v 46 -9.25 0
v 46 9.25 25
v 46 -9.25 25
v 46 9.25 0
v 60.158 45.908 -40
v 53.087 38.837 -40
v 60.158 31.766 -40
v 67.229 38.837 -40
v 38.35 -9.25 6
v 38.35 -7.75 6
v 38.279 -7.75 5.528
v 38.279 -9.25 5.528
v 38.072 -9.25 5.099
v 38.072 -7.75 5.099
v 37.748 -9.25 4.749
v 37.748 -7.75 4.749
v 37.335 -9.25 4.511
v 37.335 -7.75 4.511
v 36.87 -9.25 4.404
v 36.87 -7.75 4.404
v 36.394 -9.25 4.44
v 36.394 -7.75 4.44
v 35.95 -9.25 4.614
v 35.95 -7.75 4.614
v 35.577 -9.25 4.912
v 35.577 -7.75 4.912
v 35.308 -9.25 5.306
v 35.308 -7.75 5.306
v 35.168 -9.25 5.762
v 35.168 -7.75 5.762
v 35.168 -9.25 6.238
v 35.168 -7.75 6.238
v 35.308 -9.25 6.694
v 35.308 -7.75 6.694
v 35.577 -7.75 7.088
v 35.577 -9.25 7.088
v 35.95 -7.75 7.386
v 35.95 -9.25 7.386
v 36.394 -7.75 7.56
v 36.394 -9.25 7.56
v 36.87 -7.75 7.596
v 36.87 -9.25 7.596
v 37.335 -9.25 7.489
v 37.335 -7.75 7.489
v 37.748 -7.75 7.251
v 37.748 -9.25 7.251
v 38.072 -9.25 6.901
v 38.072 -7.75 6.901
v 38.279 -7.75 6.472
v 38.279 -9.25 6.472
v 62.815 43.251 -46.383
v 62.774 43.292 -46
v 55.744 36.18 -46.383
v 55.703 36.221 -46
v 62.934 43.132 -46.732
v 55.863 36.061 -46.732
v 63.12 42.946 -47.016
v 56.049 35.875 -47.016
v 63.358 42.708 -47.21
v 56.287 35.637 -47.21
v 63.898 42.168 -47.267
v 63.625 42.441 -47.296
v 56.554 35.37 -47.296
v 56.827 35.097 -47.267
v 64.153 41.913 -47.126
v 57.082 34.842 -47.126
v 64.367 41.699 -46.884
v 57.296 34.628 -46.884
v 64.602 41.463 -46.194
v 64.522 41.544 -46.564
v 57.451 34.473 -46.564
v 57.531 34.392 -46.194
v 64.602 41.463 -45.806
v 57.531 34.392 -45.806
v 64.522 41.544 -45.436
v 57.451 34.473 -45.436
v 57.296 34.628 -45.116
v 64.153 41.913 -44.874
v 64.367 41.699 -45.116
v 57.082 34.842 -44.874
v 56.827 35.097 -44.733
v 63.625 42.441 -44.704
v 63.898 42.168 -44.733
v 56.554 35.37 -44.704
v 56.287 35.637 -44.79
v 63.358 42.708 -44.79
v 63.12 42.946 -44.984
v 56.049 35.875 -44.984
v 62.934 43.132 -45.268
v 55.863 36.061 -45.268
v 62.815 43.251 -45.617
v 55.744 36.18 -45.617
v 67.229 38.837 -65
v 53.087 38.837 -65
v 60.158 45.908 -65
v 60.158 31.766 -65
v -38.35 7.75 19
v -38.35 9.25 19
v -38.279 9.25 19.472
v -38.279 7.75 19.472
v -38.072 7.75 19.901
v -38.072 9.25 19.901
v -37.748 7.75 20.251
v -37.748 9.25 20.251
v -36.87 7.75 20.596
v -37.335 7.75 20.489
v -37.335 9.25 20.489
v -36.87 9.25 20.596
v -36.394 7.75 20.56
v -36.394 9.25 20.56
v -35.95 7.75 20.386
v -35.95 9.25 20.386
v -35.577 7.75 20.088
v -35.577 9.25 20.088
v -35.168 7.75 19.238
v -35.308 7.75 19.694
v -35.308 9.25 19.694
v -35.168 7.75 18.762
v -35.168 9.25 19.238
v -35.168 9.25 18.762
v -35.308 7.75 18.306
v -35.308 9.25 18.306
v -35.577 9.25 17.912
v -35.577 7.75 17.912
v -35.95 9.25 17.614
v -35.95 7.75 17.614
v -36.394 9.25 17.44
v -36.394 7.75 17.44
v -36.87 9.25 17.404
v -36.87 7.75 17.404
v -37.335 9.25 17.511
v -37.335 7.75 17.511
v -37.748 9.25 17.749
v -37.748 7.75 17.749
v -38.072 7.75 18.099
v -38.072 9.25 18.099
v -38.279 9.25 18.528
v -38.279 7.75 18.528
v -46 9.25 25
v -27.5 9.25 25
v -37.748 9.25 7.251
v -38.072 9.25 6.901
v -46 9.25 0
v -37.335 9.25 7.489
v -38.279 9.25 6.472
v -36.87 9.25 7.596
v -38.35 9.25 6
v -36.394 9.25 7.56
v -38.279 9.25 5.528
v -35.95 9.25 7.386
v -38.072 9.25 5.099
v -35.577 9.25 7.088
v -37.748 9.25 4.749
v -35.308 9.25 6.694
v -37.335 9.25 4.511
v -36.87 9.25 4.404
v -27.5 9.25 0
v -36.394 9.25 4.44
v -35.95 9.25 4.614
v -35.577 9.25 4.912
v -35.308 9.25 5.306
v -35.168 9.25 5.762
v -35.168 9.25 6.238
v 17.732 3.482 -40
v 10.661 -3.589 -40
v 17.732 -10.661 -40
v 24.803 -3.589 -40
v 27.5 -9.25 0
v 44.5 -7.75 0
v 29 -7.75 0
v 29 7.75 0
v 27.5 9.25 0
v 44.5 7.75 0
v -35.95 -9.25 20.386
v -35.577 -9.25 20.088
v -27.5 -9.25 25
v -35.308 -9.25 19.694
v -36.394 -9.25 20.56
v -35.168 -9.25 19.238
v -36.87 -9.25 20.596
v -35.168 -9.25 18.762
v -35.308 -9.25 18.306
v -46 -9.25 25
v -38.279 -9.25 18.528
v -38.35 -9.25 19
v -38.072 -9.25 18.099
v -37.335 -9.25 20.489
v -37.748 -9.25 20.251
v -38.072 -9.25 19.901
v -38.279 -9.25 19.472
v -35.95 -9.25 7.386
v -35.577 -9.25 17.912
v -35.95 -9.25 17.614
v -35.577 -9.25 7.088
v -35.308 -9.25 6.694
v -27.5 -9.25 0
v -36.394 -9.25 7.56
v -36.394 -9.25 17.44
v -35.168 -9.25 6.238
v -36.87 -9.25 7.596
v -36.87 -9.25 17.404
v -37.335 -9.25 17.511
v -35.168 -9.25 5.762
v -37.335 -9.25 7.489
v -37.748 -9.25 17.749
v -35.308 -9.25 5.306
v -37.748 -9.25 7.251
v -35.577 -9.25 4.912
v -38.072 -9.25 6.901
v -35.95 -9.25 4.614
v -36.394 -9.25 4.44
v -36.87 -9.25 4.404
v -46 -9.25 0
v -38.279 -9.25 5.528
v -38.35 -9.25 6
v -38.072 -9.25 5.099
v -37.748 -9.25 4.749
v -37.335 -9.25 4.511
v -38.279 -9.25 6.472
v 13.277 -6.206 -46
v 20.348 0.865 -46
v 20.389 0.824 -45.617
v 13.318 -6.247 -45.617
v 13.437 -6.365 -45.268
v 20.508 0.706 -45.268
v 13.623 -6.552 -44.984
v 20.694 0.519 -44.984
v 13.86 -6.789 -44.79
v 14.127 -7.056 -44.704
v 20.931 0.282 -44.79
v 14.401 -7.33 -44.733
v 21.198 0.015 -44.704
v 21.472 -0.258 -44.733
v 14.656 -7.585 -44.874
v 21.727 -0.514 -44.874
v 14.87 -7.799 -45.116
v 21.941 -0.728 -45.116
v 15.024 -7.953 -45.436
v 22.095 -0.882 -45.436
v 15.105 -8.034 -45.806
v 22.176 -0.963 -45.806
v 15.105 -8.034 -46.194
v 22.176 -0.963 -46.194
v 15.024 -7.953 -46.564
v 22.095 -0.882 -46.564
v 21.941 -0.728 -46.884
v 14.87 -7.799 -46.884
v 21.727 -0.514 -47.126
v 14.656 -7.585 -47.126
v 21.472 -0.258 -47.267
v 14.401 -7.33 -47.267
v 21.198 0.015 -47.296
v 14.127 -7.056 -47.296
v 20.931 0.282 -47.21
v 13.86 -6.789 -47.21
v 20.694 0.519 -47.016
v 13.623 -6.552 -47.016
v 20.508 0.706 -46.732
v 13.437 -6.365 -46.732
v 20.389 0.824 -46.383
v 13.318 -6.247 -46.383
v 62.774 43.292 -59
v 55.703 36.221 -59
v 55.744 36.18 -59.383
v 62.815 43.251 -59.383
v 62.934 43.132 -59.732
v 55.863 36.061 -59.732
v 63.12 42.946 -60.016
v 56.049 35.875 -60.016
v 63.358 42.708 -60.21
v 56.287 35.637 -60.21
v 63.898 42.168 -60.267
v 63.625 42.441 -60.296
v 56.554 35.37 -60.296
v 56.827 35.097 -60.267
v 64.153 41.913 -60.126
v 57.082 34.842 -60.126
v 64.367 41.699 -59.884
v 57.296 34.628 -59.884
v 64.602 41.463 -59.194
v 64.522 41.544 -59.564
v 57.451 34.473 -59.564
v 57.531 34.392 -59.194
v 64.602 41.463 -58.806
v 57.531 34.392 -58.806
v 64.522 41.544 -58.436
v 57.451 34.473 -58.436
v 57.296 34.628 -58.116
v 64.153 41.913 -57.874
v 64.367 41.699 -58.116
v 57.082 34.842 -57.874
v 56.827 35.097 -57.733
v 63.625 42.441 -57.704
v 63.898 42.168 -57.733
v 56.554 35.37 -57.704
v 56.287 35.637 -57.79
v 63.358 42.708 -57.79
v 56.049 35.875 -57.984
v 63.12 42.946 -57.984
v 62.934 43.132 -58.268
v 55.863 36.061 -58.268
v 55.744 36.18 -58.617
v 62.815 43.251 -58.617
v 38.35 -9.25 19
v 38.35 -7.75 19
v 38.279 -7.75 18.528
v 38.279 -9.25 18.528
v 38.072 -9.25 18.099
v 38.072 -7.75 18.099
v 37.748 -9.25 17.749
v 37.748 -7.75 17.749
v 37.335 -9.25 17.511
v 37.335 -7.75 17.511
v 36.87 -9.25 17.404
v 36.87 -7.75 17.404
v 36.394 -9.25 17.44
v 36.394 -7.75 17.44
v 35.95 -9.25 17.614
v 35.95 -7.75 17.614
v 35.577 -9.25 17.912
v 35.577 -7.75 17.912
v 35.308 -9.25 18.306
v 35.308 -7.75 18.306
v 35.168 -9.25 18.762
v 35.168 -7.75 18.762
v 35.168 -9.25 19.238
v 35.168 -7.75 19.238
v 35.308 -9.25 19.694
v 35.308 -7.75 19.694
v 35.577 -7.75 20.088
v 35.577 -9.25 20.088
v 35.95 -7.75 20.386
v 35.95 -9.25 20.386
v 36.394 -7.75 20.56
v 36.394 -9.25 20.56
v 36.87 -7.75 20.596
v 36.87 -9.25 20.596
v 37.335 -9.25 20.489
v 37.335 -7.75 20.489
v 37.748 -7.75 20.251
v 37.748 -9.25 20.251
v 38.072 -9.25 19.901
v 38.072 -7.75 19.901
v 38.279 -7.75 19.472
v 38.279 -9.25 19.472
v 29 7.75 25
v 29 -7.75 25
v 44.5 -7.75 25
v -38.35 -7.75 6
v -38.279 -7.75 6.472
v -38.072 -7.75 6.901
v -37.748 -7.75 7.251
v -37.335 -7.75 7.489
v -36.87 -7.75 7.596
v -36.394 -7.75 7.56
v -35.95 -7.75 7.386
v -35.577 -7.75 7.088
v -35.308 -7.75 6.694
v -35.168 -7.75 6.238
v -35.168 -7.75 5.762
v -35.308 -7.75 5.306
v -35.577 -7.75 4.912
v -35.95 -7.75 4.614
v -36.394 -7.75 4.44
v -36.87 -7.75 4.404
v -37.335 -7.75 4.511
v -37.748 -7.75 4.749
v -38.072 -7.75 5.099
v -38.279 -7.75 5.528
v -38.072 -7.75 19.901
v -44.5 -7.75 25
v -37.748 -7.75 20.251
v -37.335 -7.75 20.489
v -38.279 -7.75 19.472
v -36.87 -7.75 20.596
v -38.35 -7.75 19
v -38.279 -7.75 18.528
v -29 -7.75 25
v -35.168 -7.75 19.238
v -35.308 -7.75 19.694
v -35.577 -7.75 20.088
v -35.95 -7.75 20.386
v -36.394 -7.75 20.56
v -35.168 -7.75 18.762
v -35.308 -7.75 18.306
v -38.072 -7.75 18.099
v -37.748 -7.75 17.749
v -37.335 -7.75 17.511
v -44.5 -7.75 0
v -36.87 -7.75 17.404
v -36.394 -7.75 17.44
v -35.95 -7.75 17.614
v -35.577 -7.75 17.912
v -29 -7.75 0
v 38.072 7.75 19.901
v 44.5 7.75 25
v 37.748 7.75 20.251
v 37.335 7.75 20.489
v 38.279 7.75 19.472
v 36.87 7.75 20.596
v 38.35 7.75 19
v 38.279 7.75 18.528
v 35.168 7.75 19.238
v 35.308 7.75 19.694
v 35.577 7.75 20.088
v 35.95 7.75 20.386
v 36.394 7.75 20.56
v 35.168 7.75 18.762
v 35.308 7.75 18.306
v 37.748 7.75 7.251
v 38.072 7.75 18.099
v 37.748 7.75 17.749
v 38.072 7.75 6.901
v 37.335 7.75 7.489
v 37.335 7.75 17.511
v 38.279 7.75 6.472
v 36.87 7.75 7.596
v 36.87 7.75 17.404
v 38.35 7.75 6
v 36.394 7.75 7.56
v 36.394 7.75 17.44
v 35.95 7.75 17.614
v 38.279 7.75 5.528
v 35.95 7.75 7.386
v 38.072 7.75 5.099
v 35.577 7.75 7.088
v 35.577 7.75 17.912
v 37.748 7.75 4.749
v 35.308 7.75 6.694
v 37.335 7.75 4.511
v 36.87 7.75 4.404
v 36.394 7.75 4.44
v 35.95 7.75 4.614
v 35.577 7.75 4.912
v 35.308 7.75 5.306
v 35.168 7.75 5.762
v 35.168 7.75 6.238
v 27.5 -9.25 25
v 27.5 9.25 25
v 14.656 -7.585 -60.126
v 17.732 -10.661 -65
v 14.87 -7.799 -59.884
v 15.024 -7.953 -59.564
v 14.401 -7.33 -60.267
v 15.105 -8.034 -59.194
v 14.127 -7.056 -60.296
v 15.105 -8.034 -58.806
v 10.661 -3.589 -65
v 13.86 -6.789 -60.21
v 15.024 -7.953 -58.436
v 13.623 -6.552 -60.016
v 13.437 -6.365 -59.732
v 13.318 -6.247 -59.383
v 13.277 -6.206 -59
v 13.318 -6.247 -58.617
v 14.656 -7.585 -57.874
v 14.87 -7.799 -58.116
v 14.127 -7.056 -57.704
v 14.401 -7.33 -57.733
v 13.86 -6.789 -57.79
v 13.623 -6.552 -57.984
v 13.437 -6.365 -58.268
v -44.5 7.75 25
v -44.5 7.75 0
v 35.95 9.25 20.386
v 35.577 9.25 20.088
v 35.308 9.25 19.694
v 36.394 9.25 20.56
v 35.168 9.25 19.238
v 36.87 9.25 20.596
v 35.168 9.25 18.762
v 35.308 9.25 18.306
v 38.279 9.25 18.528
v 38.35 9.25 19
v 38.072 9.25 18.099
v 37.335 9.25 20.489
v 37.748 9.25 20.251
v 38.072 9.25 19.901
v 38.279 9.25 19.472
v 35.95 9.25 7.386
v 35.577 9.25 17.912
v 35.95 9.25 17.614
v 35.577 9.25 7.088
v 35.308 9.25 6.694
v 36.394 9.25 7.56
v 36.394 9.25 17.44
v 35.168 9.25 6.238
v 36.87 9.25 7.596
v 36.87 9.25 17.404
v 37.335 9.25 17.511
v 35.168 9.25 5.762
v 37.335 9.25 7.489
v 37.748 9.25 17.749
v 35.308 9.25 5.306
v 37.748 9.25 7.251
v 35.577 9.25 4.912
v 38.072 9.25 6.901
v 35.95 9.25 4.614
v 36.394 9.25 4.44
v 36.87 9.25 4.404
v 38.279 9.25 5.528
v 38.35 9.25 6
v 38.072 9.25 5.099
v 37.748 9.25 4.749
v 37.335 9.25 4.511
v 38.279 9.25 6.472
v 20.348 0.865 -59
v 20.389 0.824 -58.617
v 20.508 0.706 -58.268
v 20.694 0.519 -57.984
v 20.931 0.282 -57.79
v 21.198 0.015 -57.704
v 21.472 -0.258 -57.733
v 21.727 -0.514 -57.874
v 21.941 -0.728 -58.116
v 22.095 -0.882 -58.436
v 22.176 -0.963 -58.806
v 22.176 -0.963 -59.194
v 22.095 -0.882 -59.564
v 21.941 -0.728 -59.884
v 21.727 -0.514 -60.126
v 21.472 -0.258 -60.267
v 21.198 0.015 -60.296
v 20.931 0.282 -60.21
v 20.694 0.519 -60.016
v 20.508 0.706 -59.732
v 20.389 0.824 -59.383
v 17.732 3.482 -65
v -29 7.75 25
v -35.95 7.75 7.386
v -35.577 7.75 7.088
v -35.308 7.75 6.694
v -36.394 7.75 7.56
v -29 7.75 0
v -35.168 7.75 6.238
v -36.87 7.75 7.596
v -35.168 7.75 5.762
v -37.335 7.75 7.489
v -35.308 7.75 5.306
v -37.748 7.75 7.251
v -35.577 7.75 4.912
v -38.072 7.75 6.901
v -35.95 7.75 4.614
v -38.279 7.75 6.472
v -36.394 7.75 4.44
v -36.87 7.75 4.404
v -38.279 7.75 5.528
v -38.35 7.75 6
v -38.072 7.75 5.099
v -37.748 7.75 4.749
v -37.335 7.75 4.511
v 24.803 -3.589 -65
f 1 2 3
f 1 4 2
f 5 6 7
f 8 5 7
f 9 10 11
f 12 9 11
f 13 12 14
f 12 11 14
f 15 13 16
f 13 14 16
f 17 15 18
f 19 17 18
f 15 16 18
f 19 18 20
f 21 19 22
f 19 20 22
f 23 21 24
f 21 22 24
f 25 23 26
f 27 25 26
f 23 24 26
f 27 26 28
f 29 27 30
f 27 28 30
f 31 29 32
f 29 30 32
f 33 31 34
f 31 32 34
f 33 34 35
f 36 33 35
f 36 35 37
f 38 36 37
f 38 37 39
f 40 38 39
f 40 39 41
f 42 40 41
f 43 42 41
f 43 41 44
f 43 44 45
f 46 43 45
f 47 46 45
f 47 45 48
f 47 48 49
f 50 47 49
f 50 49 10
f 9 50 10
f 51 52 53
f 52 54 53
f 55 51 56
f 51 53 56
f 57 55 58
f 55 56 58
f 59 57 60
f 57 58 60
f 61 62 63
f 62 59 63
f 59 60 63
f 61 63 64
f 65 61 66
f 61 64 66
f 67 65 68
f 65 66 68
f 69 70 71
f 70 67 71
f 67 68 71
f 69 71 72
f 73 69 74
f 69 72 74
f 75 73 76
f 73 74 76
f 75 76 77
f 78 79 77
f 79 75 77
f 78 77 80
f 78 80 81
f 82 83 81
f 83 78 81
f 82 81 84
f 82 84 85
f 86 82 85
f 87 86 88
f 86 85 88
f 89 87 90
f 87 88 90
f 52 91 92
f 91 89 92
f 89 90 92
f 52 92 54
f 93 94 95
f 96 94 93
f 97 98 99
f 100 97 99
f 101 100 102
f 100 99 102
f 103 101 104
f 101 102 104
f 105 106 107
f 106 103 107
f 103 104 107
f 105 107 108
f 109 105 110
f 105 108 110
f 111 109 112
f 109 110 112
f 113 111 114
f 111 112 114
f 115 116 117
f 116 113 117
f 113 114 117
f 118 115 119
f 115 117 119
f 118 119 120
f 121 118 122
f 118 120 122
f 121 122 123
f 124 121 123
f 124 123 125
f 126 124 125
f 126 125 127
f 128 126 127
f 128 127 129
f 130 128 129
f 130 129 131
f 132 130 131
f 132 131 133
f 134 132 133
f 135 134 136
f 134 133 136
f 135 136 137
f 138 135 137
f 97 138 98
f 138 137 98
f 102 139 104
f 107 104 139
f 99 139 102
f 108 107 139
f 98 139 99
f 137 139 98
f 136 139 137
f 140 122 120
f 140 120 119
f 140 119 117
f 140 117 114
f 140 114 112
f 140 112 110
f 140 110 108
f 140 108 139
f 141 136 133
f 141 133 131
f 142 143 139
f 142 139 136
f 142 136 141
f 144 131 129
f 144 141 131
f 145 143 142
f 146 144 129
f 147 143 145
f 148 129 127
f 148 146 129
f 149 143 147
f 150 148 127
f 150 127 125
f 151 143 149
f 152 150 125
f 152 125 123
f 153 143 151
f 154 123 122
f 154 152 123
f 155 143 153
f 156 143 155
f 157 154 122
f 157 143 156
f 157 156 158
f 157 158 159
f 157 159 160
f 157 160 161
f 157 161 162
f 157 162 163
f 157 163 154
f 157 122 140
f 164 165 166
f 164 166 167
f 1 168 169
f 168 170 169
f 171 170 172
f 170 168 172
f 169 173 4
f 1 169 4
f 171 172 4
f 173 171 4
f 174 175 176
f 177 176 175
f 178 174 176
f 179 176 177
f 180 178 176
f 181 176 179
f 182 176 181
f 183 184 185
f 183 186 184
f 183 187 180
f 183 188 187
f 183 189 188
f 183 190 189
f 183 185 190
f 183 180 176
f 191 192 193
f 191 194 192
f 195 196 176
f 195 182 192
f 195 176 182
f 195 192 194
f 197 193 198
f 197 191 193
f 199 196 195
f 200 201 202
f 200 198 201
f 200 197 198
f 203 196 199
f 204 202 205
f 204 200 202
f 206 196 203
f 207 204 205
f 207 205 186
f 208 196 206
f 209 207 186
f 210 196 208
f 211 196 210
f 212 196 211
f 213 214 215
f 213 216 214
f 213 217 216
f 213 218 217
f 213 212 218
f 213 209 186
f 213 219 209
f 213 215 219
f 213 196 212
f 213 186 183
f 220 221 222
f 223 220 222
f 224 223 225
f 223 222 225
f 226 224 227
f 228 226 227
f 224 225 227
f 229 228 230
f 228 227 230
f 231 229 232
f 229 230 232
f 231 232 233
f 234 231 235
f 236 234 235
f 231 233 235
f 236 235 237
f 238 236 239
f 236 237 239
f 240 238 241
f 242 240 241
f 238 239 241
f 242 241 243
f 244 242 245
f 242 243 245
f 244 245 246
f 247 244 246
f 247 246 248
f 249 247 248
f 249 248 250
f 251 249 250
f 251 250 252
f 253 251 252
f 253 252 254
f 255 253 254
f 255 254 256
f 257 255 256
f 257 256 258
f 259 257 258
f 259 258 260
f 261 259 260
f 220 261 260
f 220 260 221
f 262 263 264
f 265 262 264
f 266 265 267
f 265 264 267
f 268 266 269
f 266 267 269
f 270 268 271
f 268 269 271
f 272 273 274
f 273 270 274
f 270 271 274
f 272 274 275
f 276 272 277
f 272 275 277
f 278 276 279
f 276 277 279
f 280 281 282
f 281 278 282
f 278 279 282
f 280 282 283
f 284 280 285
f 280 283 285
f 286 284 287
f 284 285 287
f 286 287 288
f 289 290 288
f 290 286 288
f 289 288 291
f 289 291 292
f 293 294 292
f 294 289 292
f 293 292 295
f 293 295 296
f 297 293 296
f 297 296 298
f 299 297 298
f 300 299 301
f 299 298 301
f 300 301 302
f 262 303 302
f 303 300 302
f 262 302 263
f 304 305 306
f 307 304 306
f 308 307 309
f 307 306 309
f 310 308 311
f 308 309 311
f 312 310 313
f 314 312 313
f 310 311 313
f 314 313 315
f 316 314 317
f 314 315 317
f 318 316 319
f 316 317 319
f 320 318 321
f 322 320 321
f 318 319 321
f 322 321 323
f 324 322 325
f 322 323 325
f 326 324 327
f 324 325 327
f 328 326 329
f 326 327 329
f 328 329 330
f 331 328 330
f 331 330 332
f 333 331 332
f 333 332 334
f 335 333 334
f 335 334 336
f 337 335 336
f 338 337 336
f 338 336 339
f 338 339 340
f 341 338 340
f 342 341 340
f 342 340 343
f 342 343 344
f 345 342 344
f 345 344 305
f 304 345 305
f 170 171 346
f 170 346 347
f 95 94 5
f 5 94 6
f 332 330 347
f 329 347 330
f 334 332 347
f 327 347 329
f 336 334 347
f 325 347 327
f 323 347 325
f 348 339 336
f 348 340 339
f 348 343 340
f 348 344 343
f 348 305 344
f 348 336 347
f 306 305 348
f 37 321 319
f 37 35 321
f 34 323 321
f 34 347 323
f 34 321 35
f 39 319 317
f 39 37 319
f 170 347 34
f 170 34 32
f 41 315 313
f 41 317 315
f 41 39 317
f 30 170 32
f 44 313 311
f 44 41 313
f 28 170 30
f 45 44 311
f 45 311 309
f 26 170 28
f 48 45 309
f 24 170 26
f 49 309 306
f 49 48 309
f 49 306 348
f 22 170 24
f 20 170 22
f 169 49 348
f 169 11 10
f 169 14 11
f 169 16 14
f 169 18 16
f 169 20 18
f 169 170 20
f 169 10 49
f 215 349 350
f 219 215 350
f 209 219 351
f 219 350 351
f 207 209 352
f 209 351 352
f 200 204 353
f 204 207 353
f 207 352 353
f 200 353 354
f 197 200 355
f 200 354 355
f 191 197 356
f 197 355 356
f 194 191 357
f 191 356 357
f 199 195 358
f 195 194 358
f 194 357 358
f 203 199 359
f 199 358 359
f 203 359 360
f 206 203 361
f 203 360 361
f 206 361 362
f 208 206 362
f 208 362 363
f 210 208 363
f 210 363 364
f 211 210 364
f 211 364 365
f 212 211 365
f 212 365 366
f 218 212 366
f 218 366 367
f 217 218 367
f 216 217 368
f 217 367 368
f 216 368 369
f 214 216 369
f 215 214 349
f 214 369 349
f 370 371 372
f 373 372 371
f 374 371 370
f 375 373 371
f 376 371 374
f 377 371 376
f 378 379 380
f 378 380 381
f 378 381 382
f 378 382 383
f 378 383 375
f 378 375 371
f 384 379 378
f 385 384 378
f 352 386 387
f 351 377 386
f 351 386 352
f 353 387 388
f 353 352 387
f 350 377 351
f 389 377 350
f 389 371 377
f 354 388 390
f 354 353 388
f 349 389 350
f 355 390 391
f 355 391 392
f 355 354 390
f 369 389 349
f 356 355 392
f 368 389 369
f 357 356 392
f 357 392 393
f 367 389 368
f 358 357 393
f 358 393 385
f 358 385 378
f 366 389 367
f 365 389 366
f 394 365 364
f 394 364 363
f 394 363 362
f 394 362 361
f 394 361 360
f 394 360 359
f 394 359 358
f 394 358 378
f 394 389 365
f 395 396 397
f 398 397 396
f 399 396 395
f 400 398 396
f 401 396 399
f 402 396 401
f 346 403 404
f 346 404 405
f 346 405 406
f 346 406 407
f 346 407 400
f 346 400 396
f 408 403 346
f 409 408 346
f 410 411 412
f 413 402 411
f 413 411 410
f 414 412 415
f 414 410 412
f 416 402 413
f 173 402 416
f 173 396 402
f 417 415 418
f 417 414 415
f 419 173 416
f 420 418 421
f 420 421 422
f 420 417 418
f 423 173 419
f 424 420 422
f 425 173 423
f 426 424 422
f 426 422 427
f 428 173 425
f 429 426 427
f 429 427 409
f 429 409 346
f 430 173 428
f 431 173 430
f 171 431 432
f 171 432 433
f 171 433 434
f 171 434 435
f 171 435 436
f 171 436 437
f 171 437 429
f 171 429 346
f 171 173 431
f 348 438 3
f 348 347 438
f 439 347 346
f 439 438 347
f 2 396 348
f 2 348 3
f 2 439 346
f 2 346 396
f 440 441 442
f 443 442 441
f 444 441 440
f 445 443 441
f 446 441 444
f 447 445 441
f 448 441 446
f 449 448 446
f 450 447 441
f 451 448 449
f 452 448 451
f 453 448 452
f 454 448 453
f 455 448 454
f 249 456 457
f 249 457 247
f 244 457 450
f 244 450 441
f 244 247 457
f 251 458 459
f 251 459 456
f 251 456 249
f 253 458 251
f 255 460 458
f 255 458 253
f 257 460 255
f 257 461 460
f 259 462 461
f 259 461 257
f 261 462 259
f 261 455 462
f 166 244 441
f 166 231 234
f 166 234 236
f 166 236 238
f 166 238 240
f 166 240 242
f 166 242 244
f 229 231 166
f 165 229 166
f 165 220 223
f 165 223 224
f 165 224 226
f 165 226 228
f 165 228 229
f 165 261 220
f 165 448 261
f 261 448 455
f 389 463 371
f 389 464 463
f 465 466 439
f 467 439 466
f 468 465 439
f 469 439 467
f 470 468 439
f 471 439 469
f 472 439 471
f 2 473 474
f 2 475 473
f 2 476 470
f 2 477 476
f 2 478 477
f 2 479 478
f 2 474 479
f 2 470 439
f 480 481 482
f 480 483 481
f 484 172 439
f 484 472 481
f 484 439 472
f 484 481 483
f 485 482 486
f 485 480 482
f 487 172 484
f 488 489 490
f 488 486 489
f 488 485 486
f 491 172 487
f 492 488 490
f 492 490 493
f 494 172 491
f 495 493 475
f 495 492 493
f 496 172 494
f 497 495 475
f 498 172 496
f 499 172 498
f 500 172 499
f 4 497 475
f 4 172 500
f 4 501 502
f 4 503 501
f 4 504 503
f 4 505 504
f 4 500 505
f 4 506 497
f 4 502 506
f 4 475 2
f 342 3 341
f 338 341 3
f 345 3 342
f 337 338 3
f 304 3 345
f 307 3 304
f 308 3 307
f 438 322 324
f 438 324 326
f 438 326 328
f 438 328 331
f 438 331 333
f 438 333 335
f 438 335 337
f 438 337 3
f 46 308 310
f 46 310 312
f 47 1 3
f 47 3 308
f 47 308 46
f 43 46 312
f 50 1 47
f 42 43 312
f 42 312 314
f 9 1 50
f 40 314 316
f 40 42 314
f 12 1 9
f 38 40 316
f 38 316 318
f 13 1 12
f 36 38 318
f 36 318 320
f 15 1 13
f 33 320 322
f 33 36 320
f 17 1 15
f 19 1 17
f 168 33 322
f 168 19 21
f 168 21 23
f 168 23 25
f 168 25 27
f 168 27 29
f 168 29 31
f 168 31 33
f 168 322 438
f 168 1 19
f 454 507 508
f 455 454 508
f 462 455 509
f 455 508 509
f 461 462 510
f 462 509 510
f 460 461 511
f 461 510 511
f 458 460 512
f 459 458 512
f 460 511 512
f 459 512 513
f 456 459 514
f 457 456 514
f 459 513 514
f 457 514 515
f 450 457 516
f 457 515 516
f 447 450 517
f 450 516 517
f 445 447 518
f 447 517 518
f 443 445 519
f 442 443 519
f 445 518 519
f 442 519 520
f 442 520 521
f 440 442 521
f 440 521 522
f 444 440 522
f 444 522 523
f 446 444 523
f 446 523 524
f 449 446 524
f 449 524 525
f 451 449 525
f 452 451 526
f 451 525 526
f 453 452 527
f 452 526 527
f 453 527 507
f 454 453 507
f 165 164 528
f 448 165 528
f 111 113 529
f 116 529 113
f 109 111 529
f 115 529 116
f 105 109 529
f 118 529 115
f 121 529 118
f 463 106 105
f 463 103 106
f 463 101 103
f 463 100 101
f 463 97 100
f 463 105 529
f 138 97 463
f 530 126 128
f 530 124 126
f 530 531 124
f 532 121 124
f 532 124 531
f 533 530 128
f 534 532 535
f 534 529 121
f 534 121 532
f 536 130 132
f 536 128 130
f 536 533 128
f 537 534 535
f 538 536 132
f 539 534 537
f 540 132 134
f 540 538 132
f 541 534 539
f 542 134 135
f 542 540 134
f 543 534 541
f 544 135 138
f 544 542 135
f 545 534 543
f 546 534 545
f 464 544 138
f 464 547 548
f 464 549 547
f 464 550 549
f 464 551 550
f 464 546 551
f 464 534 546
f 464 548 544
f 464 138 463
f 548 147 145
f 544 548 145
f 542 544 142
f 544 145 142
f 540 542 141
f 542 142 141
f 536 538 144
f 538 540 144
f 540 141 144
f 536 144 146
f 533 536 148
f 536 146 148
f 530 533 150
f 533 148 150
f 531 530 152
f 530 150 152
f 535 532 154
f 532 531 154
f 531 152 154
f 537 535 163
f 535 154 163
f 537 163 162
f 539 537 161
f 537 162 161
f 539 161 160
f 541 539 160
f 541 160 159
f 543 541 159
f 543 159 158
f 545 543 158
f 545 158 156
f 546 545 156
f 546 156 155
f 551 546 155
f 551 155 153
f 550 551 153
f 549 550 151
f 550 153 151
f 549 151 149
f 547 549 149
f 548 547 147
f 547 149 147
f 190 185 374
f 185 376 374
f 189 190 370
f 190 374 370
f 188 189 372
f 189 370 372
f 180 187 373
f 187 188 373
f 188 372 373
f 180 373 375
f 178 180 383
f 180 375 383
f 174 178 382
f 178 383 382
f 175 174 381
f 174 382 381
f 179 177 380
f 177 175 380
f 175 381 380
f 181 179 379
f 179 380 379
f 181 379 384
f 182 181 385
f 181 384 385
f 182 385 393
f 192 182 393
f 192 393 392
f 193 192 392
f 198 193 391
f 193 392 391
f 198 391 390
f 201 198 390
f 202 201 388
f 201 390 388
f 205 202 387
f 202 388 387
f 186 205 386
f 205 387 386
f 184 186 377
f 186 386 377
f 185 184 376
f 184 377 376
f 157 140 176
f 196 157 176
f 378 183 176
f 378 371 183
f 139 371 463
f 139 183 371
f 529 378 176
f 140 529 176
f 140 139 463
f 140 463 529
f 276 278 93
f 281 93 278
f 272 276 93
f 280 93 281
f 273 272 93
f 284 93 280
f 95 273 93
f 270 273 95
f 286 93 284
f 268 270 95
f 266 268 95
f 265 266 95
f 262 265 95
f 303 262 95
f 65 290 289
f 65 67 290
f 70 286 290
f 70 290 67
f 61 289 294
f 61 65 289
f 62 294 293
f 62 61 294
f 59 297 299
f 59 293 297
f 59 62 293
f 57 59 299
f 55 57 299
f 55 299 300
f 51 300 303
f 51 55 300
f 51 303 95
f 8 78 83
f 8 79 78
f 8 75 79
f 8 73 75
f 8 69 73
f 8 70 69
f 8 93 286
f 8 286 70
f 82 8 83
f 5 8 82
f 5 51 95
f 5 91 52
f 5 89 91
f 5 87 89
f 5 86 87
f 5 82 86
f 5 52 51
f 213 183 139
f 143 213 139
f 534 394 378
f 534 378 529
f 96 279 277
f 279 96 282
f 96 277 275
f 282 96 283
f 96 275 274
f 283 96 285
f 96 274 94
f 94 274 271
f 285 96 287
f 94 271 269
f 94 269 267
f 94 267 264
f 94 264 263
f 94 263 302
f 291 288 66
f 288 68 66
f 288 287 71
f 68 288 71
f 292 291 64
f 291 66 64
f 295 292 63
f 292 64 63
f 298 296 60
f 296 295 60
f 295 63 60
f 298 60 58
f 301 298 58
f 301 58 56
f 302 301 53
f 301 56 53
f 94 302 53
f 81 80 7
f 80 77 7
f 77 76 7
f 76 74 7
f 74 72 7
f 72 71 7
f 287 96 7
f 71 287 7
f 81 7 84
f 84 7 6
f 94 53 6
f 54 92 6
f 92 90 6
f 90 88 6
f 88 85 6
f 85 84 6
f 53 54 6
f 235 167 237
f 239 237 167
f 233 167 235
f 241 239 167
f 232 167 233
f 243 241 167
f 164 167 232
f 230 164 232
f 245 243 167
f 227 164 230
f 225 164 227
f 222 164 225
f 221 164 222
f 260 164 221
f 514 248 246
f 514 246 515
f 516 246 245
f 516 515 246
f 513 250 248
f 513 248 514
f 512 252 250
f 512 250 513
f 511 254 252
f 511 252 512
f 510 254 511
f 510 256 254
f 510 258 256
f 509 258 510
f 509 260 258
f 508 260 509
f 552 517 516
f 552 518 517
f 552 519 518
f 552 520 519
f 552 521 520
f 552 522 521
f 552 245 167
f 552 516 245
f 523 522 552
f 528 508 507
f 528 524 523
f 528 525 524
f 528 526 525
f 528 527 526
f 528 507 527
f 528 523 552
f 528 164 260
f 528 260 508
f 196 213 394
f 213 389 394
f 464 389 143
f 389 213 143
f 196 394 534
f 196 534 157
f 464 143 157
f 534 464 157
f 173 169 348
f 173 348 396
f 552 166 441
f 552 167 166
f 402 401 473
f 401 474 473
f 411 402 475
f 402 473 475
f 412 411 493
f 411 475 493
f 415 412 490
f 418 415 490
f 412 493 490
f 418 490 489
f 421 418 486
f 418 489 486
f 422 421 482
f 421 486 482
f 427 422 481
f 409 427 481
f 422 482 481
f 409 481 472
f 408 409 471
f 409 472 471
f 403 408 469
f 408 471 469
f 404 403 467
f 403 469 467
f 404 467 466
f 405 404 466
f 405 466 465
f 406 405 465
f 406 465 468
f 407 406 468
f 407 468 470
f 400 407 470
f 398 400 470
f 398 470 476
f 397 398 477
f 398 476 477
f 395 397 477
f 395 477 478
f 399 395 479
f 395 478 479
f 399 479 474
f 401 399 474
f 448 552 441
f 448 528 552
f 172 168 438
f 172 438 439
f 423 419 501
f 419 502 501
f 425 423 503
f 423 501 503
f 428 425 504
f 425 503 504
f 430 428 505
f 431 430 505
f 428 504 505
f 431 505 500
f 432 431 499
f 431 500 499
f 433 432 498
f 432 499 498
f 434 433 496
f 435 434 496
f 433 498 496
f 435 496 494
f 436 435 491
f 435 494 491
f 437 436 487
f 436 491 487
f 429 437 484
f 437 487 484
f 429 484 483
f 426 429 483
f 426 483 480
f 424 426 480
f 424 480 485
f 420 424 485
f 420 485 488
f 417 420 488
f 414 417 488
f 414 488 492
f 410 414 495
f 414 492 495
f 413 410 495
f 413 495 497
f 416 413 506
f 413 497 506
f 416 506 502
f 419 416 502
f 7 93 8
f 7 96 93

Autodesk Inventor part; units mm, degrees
ref_plane "作業平面1" through (36.75, 0, 0) normal (1, 0, 0) x (0, 1, 0)
sketch "スケッチ1" plane through (0, 0, 0) normal (0, 0, 1) x (1, 0, 0)
  line L0 (36.75, 12.95) -> (36.75, -12.95) projected
  line L1 (29, -7.75) -> (44.5, -7.75)
  line L2 (44.5, -7.75) -> (44.5, 7.75)
  line L3 (44.5, 7.75) -> (29, 7.75)
  line L4 (29, 7.75) -> (29, -7.75)
  line L5 (29, -7.75) -> (44.5, 7.75) construction
  line L6 (44.5, -7.75) -> (29, 7.75) construction
  line L7 (46, -9.25) -> (27.5, -9.25)
  line L8 (27.5, -9.25) -> (27.5, 9.25)
  line L9 (27.5, 9.25) -> (46, 9.25)
  line L10 (46, 9.25) -> (46, -9.25)
  line L11 (46, -9.25) -> (27.5, 9.25) construction
  line L12 (27.5, -9.25) -> (46, 9.25) construction
  point P0 (0, 0)
  point P1 (36.75, 0)
  dimension "d1" = 15.5
  dimension "d2" = 1.5
extrude "押し出し1" add sketch "スケッチ1" along normal blind 25 contours L9 L10 L7 L0 L1 L2 L3 | L0 L3 L4 L1 L7 L8 L9
sketch "スケッチ2" plane through (27.5, 9.25, 0) normal (0, 1, 0) x (1, 0, 0)
  circle A0 centre (9.25, -19) radius 1.6
  line L0 (18.5, -25) -> (0, -25) projected
  circle A1 centre (9.25, -6) radius 1.6
  point P0 (-27.5, 0)
  point P1 (9.25, -25)
  dimension "d5" = 3.2
  dimension "d6" = 6
  dimension "d7" = 3.2
  dimension "d8" = 13
extrude "押し出し2" cut sketch "スケッチ2" against normal through all
ref_plane "作業平面2" through (27.5, 0, 0) normal (0, 1, 0) x (1, 0, 0)
mirror "ミラー1" about plane through (0, 0, 0) normal (1, 0, 0)
ref_plane "作業平面3" through (-27.5, -40, -9.25) normal (1, 0, 0) x (0, 0, -1)
ref_plane "作業平面4" through (-27.5, 1.5, 40) normal (0, 1, 0) x (1, 0, 0)
ref_plane "作業平面5" through (27.5, -14.25, 0) normal (0, -1, 0) x (1, 0, 0)
ref_plane "作業平面6" through (0, -14.25, 0) normal (0.7071068, -0.7071068, 0) x (0, 0, -1)
sketch "スケッチ10" plane through (0, -14.25, 0) normal (0.7071068, -0.7071068, 0) x (0, 0, -1)
  line L0 (40, 25.0763) -> (65, 25.0763)
  line L1 (65, 25.0763) -> (65, 15.0763)
  line L2 (65, 15.0763) -> (40, 15.0763)
  line L3 (40, 15.0763) -> (40, 25.0763)
  point P0 (0, 10.0763)
  point P1 (40, 20.0763)
  dimension "d78" = 25
  dimension "d79" = 10
  dimension "d81" = 40
  dimension "d90" = 10
extrude "押し出し10" add sketch "スケッチ10" along normal blind 10
sketch "スケッチ11" plane through (17.7316, 3.4816, -65) normal (0.7071068, 0.7071068, 0) x (-0.7071068, 0.7071068, 0)
  circle A0 centre (-5, 19) radius 1.3
  circle A1 centre (-5, 6) radius 1.3
  line L0 (0, 25) -> (-10, 25) projected
  line L1 (0, 0) -> (-10, 0) projected
  point P0 (10.0763, 65)
  point P1 (-5, 25)
  point P2 (-5, 25)
  dimension "d84" = 6
  dimension "d85" = 6
  dimension "d86" = 2.6
extrude "押し出し11" cut sketch "スケッチ11" against normal through all
ref_plane "作業平面8" through (53.0869, 38.8369, -65) normal (0.7071068, 0.7071068, 0) x (-0.7071068, 0.7071068, 0)
sketch "スケッチ13" plane through (53.0869, 38.8369, -65) normal (0.7071068, 0.7071068, 0) x (-0.7071068, 0.7071068, 0)
  circle A0 centre (-5, 19) radius 1.3 projected
  circle A1 centre (-5, 6) radius 1.3 projected
  line L0 (0, 0) -> (0, 25) projected
  line L1 (0, 25) -> (-10, 25) projected
  line L2 (-10, 0) -> (-10, 25) projected
  line L3 (0, 0) -> (-10, 0) projected
  point P0 (10.0763, 65)
extrude "押し出し13" add sketch "スケッチ13" along normal blind 10
equation "\"d5\" = d7"
properties part number "45_deg"
